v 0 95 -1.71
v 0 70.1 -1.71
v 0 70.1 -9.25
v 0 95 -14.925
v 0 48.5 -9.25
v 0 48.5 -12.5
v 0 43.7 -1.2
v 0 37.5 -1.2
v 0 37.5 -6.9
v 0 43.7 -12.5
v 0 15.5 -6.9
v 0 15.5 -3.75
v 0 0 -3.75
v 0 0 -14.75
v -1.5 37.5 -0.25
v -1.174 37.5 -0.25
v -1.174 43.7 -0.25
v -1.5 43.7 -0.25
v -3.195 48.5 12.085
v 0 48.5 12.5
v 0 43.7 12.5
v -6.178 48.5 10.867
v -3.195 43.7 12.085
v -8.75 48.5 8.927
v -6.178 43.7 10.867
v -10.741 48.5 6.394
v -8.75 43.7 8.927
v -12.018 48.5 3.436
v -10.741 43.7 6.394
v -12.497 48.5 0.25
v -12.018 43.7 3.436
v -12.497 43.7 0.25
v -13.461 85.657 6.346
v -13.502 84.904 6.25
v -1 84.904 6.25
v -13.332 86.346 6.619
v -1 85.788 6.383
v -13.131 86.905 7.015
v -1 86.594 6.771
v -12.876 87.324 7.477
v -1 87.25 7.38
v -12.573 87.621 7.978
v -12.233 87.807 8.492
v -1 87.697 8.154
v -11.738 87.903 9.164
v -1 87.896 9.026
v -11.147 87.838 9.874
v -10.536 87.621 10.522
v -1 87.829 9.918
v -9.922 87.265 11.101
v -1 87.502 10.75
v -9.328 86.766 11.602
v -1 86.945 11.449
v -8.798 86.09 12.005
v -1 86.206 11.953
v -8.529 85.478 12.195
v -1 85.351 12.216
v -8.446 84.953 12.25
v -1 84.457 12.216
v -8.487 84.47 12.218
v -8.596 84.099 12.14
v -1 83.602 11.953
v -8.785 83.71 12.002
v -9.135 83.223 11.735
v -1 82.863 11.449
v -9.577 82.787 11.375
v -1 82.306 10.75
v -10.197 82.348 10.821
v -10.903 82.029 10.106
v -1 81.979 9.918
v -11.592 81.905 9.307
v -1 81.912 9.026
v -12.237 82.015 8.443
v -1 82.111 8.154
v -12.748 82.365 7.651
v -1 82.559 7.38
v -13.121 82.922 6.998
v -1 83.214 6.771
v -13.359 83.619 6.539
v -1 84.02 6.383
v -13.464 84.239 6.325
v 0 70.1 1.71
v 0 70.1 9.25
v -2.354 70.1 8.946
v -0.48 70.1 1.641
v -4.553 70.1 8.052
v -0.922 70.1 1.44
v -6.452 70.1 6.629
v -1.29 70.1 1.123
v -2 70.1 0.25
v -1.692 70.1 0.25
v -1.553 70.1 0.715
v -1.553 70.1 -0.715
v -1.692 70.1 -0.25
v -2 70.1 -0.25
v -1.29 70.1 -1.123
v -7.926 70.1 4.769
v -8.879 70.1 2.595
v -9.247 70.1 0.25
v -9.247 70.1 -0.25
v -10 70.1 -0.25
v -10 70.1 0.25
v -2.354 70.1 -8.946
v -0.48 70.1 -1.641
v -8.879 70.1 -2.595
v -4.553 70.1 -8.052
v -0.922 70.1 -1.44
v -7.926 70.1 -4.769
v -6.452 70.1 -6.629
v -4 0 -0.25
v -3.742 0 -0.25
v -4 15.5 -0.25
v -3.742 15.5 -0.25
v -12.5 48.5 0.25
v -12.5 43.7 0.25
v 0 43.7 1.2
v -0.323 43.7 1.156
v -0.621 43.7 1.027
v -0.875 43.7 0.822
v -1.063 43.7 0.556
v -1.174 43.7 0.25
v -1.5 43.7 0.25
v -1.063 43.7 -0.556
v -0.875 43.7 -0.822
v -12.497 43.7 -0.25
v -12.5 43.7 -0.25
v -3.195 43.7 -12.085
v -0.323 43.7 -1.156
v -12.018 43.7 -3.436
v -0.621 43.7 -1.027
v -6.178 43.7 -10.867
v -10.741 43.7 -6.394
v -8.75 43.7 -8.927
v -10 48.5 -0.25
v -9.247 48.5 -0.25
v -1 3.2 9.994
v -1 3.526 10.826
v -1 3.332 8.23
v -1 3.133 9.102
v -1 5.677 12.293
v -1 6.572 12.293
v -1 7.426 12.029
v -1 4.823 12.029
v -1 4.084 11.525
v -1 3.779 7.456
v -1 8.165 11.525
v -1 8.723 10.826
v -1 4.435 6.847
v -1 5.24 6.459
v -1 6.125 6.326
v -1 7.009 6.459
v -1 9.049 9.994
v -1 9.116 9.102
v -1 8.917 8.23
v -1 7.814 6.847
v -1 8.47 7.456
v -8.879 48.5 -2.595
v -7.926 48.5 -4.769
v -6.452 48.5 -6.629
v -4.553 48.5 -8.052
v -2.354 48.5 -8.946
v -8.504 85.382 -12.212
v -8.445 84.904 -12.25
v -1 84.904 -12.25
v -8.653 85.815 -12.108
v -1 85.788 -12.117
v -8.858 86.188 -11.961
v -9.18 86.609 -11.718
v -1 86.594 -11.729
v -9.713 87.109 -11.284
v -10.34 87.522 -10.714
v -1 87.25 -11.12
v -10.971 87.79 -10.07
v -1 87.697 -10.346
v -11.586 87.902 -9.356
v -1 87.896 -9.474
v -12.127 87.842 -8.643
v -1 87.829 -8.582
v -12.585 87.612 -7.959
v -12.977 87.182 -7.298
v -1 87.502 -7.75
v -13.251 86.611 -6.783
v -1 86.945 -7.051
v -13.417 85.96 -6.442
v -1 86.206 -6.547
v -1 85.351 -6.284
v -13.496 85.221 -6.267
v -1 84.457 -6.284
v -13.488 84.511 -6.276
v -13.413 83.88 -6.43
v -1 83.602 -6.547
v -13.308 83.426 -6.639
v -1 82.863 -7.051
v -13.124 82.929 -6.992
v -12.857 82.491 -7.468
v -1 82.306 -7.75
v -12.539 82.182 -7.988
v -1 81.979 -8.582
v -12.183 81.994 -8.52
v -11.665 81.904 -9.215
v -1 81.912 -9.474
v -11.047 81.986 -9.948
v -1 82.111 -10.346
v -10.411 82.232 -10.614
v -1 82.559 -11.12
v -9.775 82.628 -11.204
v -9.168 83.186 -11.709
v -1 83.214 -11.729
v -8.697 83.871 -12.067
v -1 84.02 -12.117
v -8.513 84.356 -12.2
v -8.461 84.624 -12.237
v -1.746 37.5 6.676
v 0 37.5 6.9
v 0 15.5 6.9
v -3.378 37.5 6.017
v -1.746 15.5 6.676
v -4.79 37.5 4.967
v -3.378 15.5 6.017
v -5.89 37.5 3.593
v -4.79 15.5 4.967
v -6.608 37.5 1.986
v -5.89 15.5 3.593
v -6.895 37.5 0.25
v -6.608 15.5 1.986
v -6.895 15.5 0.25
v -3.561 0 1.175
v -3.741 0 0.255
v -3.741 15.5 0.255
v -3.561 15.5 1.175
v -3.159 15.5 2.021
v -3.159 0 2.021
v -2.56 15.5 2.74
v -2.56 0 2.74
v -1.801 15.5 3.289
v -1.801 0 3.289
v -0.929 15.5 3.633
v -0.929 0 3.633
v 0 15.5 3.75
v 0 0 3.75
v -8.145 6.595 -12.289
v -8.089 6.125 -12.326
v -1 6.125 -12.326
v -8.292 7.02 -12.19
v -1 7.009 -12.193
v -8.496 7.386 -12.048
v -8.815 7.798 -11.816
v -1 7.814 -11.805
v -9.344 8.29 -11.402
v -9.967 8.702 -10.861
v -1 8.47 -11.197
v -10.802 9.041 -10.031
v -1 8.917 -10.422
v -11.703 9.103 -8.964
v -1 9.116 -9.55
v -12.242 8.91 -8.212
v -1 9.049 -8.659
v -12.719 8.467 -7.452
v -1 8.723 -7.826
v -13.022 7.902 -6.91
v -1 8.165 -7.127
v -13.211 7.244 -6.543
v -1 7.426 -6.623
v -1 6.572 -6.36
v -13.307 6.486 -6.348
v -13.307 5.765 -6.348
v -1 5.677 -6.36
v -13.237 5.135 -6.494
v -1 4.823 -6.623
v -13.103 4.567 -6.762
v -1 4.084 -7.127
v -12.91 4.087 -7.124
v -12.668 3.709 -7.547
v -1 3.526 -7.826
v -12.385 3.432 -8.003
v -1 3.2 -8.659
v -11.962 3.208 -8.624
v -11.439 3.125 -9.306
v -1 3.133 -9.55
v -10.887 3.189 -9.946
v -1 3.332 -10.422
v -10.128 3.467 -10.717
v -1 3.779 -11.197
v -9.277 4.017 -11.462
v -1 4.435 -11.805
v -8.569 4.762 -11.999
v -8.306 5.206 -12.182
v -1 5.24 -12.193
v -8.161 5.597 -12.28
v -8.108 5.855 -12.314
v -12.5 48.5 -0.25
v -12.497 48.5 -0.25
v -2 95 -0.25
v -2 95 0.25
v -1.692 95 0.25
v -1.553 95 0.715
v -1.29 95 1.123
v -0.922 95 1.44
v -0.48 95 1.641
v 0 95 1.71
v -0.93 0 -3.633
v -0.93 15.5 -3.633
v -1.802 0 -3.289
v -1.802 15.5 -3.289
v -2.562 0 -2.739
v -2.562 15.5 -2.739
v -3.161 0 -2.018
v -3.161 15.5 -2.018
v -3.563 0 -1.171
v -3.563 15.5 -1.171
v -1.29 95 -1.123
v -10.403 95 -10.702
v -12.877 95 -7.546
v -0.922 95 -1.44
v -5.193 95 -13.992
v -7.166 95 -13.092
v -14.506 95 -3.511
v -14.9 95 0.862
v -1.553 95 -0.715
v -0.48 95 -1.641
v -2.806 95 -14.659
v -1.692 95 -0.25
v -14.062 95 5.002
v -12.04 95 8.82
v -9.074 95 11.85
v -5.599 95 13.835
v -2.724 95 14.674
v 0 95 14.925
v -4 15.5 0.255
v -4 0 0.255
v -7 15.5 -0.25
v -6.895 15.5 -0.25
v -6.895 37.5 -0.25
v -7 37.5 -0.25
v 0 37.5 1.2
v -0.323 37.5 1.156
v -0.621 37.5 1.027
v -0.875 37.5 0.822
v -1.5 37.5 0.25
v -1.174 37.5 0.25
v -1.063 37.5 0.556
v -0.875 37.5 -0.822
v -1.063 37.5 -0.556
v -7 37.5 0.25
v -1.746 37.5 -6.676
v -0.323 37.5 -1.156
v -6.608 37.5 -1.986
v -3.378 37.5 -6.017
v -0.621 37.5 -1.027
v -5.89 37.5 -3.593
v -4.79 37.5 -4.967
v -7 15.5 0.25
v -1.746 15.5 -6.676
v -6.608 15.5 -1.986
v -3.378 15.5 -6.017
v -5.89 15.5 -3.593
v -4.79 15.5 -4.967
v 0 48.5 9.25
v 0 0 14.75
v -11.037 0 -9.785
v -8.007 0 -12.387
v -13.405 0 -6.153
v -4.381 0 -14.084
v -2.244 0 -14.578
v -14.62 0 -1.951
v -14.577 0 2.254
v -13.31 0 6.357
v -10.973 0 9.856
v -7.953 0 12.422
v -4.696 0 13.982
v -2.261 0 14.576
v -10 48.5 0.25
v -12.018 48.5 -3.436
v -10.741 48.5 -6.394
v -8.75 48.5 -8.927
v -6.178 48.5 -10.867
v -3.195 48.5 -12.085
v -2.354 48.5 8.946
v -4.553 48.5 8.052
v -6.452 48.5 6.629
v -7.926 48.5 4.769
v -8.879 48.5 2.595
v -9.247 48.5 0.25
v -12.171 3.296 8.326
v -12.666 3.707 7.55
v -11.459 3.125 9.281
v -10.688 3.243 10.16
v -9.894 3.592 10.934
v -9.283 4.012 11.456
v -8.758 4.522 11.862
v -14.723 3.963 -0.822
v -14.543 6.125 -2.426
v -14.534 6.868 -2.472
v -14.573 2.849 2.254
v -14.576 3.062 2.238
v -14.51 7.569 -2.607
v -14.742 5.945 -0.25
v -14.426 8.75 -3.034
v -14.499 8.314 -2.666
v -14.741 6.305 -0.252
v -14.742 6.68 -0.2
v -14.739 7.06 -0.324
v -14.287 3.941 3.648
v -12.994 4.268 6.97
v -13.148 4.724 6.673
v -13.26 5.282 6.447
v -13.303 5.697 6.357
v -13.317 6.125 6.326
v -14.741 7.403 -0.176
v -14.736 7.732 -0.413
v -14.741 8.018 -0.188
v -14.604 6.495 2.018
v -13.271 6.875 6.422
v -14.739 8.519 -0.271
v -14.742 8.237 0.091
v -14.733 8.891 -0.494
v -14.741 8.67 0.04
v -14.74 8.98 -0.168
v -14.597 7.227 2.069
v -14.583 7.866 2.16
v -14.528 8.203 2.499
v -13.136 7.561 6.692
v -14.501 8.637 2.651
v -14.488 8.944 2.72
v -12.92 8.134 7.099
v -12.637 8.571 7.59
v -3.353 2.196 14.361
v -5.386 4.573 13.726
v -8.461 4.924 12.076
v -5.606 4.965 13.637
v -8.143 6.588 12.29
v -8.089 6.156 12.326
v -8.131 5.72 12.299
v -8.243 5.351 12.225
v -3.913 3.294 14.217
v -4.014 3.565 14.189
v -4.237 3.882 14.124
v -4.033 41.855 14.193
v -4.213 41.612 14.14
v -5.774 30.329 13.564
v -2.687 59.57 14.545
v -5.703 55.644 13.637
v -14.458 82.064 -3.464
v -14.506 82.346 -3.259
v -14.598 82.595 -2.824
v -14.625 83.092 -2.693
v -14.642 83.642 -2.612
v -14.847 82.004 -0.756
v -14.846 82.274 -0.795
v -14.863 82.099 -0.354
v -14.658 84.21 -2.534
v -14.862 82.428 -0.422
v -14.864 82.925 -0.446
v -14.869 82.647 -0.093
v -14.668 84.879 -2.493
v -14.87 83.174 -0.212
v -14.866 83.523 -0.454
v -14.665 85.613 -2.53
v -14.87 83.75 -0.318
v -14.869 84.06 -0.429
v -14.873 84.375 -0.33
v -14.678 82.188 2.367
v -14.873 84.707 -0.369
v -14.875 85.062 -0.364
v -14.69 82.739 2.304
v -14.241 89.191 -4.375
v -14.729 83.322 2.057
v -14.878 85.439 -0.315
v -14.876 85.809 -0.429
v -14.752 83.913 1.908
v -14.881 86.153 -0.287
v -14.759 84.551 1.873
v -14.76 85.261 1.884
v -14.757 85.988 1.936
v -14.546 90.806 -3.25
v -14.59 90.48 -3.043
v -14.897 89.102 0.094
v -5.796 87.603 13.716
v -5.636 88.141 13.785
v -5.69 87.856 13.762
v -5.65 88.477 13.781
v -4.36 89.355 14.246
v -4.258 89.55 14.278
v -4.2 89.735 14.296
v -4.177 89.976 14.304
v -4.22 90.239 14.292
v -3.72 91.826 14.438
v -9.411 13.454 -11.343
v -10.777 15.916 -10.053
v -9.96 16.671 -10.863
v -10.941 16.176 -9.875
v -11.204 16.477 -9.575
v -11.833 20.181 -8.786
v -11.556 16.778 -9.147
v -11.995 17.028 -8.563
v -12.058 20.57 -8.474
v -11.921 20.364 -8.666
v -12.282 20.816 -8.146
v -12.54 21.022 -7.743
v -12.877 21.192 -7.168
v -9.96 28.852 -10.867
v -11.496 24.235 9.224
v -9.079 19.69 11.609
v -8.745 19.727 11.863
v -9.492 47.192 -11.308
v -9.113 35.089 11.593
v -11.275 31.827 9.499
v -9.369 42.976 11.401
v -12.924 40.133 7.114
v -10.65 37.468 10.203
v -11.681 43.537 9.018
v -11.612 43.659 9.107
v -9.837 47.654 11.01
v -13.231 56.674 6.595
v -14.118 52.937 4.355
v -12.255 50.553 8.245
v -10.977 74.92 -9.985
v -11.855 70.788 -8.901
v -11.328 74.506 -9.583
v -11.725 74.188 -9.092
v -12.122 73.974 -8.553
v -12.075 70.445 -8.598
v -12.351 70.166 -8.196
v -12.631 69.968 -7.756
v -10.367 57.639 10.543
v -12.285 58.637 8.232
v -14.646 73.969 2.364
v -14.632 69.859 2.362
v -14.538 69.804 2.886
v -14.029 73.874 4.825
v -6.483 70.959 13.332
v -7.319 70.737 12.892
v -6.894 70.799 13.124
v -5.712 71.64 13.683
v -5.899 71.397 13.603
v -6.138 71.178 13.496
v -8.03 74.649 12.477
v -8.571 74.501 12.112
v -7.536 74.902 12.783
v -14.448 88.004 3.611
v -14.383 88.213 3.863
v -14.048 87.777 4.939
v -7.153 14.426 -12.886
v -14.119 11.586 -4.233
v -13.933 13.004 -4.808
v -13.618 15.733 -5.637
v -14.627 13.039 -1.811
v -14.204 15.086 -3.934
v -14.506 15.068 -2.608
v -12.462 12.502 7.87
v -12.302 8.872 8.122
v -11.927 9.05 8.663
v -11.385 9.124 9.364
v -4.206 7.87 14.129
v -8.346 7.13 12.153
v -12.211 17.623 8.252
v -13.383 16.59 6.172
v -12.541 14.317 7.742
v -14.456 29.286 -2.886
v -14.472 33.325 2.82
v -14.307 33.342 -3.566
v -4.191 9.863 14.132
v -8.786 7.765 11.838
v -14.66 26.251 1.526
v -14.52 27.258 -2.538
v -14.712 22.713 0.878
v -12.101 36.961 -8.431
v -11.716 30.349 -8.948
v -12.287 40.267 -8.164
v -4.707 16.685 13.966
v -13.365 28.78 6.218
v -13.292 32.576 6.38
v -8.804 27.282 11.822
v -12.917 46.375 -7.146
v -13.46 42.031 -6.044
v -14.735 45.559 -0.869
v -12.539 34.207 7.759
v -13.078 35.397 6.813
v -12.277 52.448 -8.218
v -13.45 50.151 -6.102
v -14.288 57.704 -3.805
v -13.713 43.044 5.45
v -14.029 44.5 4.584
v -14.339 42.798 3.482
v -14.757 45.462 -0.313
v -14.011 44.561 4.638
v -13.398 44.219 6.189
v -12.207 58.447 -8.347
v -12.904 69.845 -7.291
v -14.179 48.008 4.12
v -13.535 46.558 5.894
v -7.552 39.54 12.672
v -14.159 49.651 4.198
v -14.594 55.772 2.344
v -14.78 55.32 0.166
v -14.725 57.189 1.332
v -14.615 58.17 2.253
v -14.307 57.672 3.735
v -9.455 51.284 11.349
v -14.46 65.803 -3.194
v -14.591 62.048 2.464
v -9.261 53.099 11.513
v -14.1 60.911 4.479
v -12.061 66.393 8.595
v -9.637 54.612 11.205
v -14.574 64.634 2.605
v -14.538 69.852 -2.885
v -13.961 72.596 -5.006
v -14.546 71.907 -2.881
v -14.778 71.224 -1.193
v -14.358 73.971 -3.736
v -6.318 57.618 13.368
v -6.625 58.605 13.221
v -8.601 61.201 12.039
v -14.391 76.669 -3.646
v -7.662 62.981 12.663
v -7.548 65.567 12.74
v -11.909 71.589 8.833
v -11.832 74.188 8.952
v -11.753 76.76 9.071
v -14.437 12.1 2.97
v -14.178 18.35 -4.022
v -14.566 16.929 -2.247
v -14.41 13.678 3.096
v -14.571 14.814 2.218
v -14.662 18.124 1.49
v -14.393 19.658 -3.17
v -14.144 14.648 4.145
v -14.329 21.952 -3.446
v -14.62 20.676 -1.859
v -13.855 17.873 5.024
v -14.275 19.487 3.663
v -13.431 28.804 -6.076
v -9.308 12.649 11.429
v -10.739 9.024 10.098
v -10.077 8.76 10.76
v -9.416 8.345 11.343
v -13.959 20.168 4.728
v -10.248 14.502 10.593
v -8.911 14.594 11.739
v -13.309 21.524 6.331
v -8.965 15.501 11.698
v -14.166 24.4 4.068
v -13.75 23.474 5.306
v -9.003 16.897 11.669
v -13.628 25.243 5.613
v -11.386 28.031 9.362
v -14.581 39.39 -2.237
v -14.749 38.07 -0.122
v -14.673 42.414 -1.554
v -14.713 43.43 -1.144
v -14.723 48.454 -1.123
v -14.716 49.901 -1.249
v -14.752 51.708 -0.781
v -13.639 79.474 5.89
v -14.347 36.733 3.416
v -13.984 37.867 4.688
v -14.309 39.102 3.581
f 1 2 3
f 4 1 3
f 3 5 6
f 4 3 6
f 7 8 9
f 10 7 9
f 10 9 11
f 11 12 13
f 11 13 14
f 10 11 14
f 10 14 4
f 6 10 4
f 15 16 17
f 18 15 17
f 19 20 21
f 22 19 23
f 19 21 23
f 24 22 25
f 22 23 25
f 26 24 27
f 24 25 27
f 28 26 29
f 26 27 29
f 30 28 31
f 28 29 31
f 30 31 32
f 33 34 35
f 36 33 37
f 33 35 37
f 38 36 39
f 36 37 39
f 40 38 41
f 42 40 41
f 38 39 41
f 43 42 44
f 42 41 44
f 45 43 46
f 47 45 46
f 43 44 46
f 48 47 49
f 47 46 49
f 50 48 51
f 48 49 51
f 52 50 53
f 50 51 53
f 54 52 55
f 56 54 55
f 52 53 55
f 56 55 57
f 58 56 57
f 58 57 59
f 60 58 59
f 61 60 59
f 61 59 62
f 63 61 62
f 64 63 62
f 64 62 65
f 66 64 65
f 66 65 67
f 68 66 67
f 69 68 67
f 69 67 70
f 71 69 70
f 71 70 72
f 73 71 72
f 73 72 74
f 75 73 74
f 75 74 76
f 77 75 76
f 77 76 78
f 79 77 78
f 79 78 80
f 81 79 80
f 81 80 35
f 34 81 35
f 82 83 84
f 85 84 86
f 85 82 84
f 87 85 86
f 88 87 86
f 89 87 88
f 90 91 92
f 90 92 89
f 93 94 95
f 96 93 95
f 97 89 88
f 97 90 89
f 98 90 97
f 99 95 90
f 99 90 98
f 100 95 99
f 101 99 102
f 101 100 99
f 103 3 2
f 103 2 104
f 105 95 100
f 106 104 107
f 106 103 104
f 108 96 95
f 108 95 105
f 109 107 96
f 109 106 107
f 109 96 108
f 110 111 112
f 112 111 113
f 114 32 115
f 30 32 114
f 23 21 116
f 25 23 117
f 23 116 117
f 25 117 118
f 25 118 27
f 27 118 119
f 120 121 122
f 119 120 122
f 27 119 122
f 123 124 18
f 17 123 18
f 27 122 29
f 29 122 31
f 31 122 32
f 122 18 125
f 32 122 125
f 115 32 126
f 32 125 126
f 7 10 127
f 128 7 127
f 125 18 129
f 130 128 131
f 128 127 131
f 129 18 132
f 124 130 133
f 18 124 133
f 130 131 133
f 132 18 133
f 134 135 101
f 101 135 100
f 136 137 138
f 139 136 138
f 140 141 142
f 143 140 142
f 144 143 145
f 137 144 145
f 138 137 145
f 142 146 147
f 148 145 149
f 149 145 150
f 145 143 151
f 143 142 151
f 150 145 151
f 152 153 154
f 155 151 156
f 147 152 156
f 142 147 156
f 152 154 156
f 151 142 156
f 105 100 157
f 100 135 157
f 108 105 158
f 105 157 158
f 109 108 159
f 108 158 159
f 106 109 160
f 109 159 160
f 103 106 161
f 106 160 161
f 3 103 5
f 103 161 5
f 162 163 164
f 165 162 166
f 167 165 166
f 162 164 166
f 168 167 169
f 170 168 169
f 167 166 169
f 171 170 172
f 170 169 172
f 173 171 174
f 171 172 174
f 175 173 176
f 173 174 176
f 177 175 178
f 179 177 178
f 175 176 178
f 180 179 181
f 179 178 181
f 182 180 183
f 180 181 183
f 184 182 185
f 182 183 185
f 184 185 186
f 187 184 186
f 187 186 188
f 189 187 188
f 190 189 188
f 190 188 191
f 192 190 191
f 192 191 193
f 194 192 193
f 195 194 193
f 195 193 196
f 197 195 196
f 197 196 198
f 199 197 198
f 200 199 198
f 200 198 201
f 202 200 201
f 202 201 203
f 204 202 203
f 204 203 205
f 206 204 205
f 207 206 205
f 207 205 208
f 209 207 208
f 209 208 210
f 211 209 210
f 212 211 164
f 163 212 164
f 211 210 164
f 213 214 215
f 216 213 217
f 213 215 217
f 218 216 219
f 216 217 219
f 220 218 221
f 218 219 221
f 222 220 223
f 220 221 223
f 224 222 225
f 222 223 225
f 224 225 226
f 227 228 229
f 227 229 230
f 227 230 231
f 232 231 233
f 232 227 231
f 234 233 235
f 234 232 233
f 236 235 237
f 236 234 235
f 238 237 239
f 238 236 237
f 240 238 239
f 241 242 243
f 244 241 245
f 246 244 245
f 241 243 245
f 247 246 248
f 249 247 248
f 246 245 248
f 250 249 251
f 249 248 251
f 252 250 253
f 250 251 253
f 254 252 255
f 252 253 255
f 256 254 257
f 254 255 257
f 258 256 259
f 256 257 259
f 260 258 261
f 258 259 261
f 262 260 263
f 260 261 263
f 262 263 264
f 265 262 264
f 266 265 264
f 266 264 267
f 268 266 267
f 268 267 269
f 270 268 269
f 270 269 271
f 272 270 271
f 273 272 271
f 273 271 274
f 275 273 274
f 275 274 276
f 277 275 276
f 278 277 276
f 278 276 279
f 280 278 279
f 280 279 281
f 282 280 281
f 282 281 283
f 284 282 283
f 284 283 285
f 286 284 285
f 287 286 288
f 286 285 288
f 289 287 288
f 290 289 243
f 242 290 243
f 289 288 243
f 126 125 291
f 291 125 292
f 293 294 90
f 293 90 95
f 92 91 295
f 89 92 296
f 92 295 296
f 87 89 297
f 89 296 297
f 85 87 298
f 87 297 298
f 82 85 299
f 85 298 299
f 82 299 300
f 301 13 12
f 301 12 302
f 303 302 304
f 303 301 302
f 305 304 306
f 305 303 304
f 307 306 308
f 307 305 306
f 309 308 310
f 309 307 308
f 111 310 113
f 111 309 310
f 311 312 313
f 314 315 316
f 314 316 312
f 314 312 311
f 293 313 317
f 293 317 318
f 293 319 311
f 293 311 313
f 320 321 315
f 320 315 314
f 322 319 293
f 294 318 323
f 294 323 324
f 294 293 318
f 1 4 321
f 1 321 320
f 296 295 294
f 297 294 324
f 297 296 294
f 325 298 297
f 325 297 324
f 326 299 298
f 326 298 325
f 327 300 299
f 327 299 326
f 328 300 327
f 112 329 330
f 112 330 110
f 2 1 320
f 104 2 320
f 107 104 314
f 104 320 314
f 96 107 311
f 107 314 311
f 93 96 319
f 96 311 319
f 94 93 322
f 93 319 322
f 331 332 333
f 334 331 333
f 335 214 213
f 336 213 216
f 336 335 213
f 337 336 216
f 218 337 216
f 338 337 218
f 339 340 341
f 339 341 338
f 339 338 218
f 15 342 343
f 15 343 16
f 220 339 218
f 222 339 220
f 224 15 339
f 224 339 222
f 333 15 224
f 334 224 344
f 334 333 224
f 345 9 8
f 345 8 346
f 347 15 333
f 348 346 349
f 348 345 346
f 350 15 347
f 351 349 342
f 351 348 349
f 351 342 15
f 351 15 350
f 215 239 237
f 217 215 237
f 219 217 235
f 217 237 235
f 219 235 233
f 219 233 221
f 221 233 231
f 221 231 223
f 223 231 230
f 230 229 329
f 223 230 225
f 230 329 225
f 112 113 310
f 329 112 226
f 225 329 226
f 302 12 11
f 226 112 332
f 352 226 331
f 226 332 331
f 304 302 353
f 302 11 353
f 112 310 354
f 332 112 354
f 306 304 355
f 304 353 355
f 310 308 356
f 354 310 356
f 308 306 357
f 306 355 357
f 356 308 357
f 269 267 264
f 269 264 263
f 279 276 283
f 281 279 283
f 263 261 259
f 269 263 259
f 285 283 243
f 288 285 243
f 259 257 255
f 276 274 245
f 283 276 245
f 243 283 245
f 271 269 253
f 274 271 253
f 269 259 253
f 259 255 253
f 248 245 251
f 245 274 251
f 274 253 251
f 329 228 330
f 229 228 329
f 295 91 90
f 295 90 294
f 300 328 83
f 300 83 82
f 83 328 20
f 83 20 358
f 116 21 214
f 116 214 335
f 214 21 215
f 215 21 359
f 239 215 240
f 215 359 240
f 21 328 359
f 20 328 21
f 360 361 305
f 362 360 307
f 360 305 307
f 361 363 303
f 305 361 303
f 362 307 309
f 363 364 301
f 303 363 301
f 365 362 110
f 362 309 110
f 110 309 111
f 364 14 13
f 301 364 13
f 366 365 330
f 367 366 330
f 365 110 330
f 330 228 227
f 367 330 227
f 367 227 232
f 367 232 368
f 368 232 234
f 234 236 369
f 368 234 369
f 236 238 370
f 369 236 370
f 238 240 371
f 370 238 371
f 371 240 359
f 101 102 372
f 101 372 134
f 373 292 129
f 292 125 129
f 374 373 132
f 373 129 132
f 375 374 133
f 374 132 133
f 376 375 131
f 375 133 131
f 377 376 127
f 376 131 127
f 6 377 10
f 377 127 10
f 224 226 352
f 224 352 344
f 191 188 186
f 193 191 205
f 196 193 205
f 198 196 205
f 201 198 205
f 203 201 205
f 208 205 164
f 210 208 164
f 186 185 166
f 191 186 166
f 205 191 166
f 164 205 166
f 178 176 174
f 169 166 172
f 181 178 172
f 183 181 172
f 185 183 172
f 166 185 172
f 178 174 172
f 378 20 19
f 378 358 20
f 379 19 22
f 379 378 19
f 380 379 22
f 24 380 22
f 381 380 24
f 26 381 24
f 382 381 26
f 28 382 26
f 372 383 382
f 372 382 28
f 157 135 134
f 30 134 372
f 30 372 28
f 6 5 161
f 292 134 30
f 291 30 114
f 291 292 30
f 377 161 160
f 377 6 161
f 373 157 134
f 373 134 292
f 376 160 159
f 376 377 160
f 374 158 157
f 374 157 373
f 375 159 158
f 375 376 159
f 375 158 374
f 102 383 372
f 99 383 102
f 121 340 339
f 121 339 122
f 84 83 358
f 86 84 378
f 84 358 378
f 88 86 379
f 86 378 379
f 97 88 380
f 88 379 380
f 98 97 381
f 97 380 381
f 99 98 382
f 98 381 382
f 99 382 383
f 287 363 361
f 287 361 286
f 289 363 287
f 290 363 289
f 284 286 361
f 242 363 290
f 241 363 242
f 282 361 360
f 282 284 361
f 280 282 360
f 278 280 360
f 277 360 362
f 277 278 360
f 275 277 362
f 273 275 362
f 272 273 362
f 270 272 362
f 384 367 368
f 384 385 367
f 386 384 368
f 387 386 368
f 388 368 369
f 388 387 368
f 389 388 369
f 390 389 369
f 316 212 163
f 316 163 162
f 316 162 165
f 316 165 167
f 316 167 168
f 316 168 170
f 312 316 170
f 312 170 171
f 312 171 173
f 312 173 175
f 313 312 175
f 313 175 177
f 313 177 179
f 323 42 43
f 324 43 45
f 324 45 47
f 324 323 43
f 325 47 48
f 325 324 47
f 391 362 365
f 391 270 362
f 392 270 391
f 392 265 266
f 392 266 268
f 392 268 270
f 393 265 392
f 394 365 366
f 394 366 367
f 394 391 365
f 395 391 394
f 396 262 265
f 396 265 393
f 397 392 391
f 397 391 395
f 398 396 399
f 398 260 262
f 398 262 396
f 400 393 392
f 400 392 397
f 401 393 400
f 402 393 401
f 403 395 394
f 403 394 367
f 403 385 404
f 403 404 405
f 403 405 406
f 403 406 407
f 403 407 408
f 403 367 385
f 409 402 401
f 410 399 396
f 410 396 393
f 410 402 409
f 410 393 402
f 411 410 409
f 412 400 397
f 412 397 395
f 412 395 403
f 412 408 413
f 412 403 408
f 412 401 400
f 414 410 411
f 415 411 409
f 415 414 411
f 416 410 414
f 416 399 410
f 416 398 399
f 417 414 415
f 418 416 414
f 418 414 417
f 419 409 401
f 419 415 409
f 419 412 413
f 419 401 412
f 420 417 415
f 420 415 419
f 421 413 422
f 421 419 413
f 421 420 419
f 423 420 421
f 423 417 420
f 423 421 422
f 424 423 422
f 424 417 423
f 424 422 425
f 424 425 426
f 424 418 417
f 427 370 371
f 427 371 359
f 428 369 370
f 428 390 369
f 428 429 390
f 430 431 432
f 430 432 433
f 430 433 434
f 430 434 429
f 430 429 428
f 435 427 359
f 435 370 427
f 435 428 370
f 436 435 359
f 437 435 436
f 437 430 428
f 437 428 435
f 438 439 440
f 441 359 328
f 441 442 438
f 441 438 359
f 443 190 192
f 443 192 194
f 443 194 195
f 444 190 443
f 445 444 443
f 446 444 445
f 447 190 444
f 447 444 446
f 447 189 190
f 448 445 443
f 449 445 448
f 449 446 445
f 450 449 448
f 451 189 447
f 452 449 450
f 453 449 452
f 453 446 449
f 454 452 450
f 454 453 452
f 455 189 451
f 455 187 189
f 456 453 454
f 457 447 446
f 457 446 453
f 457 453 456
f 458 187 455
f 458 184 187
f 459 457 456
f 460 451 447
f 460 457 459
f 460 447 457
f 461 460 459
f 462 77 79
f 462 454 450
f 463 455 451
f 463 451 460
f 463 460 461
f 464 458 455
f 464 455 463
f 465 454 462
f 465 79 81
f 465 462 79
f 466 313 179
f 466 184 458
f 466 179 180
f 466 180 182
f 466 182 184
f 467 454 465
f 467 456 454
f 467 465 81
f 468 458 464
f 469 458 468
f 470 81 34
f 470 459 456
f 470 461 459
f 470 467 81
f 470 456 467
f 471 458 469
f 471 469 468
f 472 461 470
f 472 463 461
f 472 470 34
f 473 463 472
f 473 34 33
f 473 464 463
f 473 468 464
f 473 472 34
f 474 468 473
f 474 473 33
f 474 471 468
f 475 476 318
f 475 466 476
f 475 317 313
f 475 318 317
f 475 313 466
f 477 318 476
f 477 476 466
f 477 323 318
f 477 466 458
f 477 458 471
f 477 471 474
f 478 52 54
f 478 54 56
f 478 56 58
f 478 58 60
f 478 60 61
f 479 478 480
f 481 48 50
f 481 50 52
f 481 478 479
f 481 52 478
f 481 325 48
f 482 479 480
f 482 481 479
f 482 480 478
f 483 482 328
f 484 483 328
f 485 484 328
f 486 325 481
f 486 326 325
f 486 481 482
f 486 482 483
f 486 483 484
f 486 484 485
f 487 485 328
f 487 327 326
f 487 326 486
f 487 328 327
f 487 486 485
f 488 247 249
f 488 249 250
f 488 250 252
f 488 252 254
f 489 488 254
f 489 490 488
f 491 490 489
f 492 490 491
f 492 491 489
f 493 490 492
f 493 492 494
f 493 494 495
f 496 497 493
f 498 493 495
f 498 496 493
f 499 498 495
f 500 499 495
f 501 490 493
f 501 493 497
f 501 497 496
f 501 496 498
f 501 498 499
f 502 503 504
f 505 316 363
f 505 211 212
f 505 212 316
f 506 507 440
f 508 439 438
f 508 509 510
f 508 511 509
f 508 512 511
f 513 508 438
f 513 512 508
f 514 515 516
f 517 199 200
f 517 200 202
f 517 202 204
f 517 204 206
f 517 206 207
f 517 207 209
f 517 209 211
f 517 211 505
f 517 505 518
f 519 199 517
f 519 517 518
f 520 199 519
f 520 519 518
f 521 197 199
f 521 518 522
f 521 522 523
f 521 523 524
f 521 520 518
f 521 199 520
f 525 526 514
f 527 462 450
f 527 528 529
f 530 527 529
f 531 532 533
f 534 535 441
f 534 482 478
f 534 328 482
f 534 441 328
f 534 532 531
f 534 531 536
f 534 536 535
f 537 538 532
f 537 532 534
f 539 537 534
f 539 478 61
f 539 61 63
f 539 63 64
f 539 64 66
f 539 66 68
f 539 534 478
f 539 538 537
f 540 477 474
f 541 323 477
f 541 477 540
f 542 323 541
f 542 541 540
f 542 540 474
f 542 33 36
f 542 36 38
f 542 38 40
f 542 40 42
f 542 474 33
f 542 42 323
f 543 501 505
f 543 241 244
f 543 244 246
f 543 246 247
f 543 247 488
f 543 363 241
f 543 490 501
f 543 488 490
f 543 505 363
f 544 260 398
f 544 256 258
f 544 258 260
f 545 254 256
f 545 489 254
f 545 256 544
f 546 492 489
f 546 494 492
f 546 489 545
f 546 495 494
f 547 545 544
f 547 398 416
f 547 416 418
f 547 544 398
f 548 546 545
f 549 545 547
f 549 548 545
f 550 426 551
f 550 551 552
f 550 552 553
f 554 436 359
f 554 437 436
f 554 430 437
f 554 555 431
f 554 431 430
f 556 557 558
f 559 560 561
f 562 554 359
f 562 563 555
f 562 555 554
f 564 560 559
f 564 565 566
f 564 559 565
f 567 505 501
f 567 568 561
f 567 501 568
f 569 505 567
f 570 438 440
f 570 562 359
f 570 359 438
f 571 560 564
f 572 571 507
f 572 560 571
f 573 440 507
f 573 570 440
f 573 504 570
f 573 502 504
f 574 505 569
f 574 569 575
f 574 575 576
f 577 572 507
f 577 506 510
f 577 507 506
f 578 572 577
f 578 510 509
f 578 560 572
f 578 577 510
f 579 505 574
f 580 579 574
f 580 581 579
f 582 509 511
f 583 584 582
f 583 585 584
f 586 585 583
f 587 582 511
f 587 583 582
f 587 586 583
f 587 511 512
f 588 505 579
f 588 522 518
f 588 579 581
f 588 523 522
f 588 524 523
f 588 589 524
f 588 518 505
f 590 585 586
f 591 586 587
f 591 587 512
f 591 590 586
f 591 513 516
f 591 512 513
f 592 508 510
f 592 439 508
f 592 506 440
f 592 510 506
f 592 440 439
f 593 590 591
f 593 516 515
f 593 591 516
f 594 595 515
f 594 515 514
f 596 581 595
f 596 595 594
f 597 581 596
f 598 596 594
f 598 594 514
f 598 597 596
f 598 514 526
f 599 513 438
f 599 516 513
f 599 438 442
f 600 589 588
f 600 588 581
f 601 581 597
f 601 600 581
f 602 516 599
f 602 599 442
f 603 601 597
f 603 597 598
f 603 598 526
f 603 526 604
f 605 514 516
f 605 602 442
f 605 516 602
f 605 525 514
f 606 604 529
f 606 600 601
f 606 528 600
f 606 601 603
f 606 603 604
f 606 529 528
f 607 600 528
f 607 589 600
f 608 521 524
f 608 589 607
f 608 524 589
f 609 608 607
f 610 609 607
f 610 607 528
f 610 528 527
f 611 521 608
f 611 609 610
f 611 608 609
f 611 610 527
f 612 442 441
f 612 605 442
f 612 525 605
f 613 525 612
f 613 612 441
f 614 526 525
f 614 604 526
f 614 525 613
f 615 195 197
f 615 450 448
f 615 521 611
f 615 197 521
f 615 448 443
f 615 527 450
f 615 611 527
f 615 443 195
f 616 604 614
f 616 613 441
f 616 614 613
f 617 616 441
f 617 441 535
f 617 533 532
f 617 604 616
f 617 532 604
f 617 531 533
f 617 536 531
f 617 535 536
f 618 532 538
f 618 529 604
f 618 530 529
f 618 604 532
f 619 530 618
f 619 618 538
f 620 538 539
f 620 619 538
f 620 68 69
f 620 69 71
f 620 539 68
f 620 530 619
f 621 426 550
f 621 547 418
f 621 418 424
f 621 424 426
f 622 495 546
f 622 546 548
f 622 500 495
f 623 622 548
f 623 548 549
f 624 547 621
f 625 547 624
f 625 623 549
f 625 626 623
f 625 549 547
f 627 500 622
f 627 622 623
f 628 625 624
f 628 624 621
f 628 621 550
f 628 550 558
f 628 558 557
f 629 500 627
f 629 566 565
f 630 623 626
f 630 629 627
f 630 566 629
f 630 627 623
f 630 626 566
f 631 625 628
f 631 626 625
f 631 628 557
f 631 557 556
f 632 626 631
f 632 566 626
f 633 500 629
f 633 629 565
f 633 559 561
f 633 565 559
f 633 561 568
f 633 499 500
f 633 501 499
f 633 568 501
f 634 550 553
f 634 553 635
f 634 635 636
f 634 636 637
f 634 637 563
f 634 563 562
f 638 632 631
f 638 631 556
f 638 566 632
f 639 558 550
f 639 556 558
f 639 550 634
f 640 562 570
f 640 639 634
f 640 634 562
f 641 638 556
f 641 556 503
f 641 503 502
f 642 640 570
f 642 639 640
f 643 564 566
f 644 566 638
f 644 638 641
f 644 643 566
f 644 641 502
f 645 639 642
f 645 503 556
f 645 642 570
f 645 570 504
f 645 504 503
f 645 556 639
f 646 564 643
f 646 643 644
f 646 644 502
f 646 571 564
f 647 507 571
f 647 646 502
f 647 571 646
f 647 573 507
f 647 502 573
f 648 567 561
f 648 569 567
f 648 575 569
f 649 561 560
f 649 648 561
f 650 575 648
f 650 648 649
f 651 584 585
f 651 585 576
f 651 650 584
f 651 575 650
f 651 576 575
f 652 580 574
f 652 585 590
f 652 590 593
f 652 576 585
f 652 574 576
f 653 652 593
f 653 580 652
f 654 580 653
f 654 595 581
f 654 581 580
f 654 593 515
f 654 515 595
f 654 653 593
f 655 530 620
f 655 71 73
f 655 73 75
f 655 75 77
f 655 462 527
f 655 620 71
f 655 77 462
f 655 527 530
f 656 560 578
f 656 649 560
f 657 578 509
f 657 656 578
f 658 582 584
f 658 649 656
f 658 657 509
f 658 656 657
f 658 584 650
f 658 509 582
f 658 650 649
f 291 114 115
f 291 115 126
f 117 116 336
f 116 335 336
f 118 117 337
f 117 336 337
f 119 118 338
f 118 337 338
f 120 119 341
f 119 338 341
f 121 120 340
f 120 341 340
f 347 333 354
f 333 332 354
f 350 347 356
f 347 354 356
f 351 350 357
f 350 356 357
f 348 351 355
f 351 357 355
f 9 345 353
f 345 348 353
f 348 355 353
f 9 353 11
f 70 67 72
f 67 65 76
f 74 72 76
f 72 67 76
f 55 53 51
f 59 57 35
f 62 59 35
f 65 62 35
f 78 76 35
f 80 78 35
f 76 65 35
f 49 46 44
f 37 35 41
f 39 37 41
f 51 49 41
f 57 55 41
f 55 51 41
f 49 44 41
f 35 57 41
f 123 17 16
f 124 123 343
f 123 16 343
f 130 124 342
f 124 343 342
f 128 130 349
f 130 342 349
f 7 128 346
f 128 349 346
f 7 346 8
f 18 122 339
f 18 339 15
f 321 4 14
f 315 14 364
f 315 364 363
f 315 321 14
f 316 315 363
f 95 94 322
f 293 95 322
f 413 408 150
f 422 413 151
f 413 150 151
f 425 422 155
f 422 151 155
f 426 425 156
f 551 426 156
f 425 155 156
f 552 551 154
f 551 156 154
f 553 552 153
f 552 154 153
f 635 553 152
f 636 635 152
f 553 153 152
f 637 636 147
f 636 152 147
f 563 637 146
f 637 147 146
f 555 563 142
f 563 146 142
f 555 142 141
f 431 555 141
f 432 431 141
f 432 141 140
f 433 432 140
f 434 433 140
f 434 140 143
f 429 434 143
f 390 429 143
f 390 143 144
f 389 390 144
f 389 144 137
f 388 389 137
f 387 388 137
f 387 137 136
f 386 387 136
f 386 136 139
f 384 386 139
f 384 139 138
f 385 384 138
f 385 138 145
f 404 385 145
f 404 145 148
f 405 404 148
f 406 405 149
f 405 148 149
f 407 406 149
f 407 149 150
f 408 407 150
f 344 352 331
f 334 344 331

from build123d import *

# Parameters (mm, degrees)
SKETCH3_W           = 21.993363762
SKETCH3_H           = 30.202832843
CUT_EXTRUDE1_DEPTH  = 100
SKETCH5_R           = 3.75
CUT_EXTRUDE4_DEPTH  = 15.5
SKETCH6_R           = 6.9
CUT_EXTRUDE5_DEPTH  = 22
SKETCH7_R           = 1.2
CUT_EXTRUDE6_DEPTH  = 6.2
SKETCH8_R           = 12.5
CUT_EXTRUDE7_DEPTH  = 4.8
SKETCH9_R           = 9.25
CUT_EXTRUDE8_DEPTH  = 21.6
SKETCH10_R          = 1.71
CUT_EXTRUDE9_DEPTH  = 40
SKETCH12_W          = 0.5
SKETCH12_H          = 24.9
CUT_EXTRUDE10_DEPTH = 2
SKETCH13_W          = 0.5
SKETCH13_H          = 21.6
CUT_EXTRUDE11_DEPTH = 10
SKETCH14_W          = 0.5
SKETCH14_H          = 4.8
CUT_EXTRUDE12_DEPTH = 12.5
SKETCH15_W          = 0.5
SKETCH15_H          = 6.2
CUT_EXTRUDE13_DEPTH = 1.5
SKETCH16_W          = 0.500221157
SKETCH16_H          = 22
CUT_EXTRUDE14_DEPTH = 7
SKETCH17_W          = 0.505614017
SKETCH17_H          = 15.5
CUT_EXTRUDE15_DEPTH = 4
CUT_EXTRUDE16_START = -1
SKETCH18_R          = 3
CUT_EXTRUDE16_DEPTH = 15


with BuildPart() as part:
    # Loft1: read off the stored shape, not the designer's step
    # Loft1: loft between two sections, ruled curve by curve
    loft1_from = [
        Edge.make_bspline([(-4.381363328, 0, -14.084252035), (-32.549867398, 0, -5.321525378), (-23.787140742, 0, 22.846978692), (4.381363328, 0, 14.084252035), (32.549867398, 0, 5.321525378), (23.787140742, 0, -22.846978692), (-4.381363328, 0, -14.084252035)], [0, 0, 0, 0, 0.5, 0.5, 0.5, 1, 1, 1, 1], 3, [1, 0.333333333, 0.333333333, 1, 0.333333333, 0.333333333, 1]),
    ]
    loft1_to = [
        Edge.make_bspline([(-7.165507724, 95, -13.092407115), (-33.350321953, 95, 1.238608334), (-19.019306505, 95, 27.423422563), (7.165507724, 95, 13.092407115), (33.350321953, 95, -1.238608334), (19.019306505, 95, -27.423422563), (-7.165507724, 95, -13.092407115)], [0, 0, 0, 0, 0.5, 0.5, 0.5, 1, 1, 1, 1], 3, [1, 0.333333333, 0.333333333, 1, 0.333333333, 0.333333333, 1]),
    ]
    loft1 = Solid(Shell([*[Face.make_surface_from_curves(loft1_from[k], loft1_to[k]) for k in range(1)], Face(Wire(loft1_from)), Face(Wire(loft1_to))]))
    add(loft1)

    # Sketch3 → Cut-Extrude1 (cut)
    with BuildSketch(Plane(origin=(0, 0, 0), x_dir=(1, 0, 0), z_dir=(0, 1, 0))):
        with Locations((10.996681881, -0.176416421)):
            Rectangle(SKETCH3_W, SKETCH3_H)
    extrude(amount=CUT_EXTRUDE1_DEPTH, mode=Mode.SUBTRACT)

    # Sketch5 → Cut-Extrude4 (cut)
    with BuildSketch(Plane(origin=(0, 0, 0), x_dir=(1, 0, 0), z_dir=(0, 1, 0))):
        Circle(SKETCH5_R)
    extrude(amount=CUT_EXTRUDE4_DEPTH, mode=Mode.SUBTRACT)

    # Sketch6 → Cut-Extrude5 (cut)
    with BuildSketch(Plane(origin=(0, 15.5, 0), x_dir=(-1, 0, 0), z_dir=(0, -1, 0))):
        Circle(SKETCH6_R)
    extrude(amount=-CUT_EXTRUDE5_DEPTH, mode=Mode.SUBTRACT)

    # Sketch7 → Cut-Extrude6 (cut)
    with BuildSketch(Plane(origin=(0, 37.5, 0), x_dir=(-1, 0, 0), z_dir=(0, -1, 0))):
        Circle(SKETCH7_R)
    extrude(amount=-CUT_EXTRUDE6_DEPTH, mode=Mode.SUBTRACT)

    # Sketch8 → Cut-Extrude7 (cut)
    with BuildSketch(Plane(origin=(0, 43.7, 0), x_dir=(-1, 0, 0), z_dir=(0, -1, 0))):
        Circle(SKETCH8_R)
    extrude(amount=-CUT_EXTRUDE7_DEPTH, mode=Mode.SUBTRACT)

    # Sketch9 → Cut-Extrude8 (cut)
    with BuildSketch(Plane(origin=(0, 48.5, 0), x_dir=(-1, 0, 0), z_dir=(0, -1, 0))):
        Circle(SKETCH9_R)
    extrude(amount=-CUT_EXTRUDE8_DEPTH, mode=Mode.SUBTRACT)

    # Sketch10 → Cut-Extrude9 (cut)
    with BuildSketch(Plane(origin=(0, 95, 0), x_dir=(1, 0, 0), z_dir=(0, 1, 0))):
        Circle(SKETCH10_R)
    extrude(amount=-CUT_EXTRUDE9_DEPTH, mode=Mode.SUBTRACT)

    # Sketch12 → Cut-Extrude10 (cut)
    with BuildSketch(Plane(origin=(0, 0, 0), x_dir=(0, 0, -1), z_dir=(1, 0, 0))):
        with Locations((0, 82.55)):
            Rectangle(SKETCH12_W, SKETCH12_H)
    extrude(amount=-CUT_EXTRUDE10_DEPTH, mode=Mode.SUBTRACT)

    # Sketch13 → Cut-Extrude11 (cut)
    with BuildSketch(Plane(origin=(0, 0, 0), x_dir=(0, 0, -1), z_dir=(1, 0, 0))):
        with Locations((0, 59.3)):
            Rectangle(SKETCH13_W, SKETCH13_H)
    extrude(amount=-CUT_EXTRUDE11_DEPTH, mode=Mode.SUBTRACT)

    # Sketch14 → Cut-Extrude12 (cut)
    with BuildSketch(Plane(origin=(0, 0, 0), x_dir=(0, 0, -1), z_dir=(1, 0, 0))):
        with Locations((0, 46.1)):
            Rectangle(SKETCH14_W, SKETCH14_H)
    extrude(amount=-CUT_EXTRUDE12_DEPTH, mode=Mode.SUBTRACT)

    # Sketch15 → Cut-Extrude13 (cut)
    with BuildSketch(Plane(origin=(0, 0, 0), x_dir=(0, 0, -1), z_dir=(1, 0, 0))):
        with Locations((0, 40.6)):
            Rectangle(SKETCH15_W, SKETCH15_H)
    extrude(amount=-CUT_EXTRUDE13_DEPTH, mode=Mode.SUBTRACT)

    # Sketch16 → Cut-Extrude14 (cut)
    with BuildSketch(Plane(origin=(0, 0, 0), x_dir=(0, 0, -1), z_dir=(1, 0, 0))):
        with Locations((0.000110579, 26.5)):
            Rectangle(SKETCH16_W, SKETCH16_H)
    extrude(amount=-CUT_EXTRUDE14_DEPTH, mode=Mode.SUBTRACT)

    # Sketch17 → Cut-Extrude15 (cut)
    with BuildSketch(Plane(origin=(0, 0, 0), x_dir=(0, 0, -1), z_dir=(1, 0, 0))):
        with Locations((-0.002585851, 7.75)):
            Rectangle(SKETCH17_W, SKETCH17_H)
    extrude(amount=-CUT_EXTRUDE15_DEPTH, mode=Mode.SUBTRACT)

    # Sketch18 → Cut-Extrude16 (cut)
    with BuildSketch(Plane(origin=(0, 0, 0), x_dir=(0, 0, -1), z_dir=(1, 0, 0)).offset(CUT_EXTRUDE16_START)):
        with Locations((-9.326204078, 6.12452291)):
            Circle(SKETCH18_R)
        with Locations((-9.25, 84.904010386)):
            Circle(SKETCH18_R)
        with Locations((9.326204078, 6.12452291)):
            Circle(SKETCH18_R)
        with Locations((9.25, 84.904010386)):
            Circle(SKETCH18_R)
    extrude(amount=-CUT_EXTRUDE16_DEPTH, mode=Mode.SUBTRACT)


solid = part.part
